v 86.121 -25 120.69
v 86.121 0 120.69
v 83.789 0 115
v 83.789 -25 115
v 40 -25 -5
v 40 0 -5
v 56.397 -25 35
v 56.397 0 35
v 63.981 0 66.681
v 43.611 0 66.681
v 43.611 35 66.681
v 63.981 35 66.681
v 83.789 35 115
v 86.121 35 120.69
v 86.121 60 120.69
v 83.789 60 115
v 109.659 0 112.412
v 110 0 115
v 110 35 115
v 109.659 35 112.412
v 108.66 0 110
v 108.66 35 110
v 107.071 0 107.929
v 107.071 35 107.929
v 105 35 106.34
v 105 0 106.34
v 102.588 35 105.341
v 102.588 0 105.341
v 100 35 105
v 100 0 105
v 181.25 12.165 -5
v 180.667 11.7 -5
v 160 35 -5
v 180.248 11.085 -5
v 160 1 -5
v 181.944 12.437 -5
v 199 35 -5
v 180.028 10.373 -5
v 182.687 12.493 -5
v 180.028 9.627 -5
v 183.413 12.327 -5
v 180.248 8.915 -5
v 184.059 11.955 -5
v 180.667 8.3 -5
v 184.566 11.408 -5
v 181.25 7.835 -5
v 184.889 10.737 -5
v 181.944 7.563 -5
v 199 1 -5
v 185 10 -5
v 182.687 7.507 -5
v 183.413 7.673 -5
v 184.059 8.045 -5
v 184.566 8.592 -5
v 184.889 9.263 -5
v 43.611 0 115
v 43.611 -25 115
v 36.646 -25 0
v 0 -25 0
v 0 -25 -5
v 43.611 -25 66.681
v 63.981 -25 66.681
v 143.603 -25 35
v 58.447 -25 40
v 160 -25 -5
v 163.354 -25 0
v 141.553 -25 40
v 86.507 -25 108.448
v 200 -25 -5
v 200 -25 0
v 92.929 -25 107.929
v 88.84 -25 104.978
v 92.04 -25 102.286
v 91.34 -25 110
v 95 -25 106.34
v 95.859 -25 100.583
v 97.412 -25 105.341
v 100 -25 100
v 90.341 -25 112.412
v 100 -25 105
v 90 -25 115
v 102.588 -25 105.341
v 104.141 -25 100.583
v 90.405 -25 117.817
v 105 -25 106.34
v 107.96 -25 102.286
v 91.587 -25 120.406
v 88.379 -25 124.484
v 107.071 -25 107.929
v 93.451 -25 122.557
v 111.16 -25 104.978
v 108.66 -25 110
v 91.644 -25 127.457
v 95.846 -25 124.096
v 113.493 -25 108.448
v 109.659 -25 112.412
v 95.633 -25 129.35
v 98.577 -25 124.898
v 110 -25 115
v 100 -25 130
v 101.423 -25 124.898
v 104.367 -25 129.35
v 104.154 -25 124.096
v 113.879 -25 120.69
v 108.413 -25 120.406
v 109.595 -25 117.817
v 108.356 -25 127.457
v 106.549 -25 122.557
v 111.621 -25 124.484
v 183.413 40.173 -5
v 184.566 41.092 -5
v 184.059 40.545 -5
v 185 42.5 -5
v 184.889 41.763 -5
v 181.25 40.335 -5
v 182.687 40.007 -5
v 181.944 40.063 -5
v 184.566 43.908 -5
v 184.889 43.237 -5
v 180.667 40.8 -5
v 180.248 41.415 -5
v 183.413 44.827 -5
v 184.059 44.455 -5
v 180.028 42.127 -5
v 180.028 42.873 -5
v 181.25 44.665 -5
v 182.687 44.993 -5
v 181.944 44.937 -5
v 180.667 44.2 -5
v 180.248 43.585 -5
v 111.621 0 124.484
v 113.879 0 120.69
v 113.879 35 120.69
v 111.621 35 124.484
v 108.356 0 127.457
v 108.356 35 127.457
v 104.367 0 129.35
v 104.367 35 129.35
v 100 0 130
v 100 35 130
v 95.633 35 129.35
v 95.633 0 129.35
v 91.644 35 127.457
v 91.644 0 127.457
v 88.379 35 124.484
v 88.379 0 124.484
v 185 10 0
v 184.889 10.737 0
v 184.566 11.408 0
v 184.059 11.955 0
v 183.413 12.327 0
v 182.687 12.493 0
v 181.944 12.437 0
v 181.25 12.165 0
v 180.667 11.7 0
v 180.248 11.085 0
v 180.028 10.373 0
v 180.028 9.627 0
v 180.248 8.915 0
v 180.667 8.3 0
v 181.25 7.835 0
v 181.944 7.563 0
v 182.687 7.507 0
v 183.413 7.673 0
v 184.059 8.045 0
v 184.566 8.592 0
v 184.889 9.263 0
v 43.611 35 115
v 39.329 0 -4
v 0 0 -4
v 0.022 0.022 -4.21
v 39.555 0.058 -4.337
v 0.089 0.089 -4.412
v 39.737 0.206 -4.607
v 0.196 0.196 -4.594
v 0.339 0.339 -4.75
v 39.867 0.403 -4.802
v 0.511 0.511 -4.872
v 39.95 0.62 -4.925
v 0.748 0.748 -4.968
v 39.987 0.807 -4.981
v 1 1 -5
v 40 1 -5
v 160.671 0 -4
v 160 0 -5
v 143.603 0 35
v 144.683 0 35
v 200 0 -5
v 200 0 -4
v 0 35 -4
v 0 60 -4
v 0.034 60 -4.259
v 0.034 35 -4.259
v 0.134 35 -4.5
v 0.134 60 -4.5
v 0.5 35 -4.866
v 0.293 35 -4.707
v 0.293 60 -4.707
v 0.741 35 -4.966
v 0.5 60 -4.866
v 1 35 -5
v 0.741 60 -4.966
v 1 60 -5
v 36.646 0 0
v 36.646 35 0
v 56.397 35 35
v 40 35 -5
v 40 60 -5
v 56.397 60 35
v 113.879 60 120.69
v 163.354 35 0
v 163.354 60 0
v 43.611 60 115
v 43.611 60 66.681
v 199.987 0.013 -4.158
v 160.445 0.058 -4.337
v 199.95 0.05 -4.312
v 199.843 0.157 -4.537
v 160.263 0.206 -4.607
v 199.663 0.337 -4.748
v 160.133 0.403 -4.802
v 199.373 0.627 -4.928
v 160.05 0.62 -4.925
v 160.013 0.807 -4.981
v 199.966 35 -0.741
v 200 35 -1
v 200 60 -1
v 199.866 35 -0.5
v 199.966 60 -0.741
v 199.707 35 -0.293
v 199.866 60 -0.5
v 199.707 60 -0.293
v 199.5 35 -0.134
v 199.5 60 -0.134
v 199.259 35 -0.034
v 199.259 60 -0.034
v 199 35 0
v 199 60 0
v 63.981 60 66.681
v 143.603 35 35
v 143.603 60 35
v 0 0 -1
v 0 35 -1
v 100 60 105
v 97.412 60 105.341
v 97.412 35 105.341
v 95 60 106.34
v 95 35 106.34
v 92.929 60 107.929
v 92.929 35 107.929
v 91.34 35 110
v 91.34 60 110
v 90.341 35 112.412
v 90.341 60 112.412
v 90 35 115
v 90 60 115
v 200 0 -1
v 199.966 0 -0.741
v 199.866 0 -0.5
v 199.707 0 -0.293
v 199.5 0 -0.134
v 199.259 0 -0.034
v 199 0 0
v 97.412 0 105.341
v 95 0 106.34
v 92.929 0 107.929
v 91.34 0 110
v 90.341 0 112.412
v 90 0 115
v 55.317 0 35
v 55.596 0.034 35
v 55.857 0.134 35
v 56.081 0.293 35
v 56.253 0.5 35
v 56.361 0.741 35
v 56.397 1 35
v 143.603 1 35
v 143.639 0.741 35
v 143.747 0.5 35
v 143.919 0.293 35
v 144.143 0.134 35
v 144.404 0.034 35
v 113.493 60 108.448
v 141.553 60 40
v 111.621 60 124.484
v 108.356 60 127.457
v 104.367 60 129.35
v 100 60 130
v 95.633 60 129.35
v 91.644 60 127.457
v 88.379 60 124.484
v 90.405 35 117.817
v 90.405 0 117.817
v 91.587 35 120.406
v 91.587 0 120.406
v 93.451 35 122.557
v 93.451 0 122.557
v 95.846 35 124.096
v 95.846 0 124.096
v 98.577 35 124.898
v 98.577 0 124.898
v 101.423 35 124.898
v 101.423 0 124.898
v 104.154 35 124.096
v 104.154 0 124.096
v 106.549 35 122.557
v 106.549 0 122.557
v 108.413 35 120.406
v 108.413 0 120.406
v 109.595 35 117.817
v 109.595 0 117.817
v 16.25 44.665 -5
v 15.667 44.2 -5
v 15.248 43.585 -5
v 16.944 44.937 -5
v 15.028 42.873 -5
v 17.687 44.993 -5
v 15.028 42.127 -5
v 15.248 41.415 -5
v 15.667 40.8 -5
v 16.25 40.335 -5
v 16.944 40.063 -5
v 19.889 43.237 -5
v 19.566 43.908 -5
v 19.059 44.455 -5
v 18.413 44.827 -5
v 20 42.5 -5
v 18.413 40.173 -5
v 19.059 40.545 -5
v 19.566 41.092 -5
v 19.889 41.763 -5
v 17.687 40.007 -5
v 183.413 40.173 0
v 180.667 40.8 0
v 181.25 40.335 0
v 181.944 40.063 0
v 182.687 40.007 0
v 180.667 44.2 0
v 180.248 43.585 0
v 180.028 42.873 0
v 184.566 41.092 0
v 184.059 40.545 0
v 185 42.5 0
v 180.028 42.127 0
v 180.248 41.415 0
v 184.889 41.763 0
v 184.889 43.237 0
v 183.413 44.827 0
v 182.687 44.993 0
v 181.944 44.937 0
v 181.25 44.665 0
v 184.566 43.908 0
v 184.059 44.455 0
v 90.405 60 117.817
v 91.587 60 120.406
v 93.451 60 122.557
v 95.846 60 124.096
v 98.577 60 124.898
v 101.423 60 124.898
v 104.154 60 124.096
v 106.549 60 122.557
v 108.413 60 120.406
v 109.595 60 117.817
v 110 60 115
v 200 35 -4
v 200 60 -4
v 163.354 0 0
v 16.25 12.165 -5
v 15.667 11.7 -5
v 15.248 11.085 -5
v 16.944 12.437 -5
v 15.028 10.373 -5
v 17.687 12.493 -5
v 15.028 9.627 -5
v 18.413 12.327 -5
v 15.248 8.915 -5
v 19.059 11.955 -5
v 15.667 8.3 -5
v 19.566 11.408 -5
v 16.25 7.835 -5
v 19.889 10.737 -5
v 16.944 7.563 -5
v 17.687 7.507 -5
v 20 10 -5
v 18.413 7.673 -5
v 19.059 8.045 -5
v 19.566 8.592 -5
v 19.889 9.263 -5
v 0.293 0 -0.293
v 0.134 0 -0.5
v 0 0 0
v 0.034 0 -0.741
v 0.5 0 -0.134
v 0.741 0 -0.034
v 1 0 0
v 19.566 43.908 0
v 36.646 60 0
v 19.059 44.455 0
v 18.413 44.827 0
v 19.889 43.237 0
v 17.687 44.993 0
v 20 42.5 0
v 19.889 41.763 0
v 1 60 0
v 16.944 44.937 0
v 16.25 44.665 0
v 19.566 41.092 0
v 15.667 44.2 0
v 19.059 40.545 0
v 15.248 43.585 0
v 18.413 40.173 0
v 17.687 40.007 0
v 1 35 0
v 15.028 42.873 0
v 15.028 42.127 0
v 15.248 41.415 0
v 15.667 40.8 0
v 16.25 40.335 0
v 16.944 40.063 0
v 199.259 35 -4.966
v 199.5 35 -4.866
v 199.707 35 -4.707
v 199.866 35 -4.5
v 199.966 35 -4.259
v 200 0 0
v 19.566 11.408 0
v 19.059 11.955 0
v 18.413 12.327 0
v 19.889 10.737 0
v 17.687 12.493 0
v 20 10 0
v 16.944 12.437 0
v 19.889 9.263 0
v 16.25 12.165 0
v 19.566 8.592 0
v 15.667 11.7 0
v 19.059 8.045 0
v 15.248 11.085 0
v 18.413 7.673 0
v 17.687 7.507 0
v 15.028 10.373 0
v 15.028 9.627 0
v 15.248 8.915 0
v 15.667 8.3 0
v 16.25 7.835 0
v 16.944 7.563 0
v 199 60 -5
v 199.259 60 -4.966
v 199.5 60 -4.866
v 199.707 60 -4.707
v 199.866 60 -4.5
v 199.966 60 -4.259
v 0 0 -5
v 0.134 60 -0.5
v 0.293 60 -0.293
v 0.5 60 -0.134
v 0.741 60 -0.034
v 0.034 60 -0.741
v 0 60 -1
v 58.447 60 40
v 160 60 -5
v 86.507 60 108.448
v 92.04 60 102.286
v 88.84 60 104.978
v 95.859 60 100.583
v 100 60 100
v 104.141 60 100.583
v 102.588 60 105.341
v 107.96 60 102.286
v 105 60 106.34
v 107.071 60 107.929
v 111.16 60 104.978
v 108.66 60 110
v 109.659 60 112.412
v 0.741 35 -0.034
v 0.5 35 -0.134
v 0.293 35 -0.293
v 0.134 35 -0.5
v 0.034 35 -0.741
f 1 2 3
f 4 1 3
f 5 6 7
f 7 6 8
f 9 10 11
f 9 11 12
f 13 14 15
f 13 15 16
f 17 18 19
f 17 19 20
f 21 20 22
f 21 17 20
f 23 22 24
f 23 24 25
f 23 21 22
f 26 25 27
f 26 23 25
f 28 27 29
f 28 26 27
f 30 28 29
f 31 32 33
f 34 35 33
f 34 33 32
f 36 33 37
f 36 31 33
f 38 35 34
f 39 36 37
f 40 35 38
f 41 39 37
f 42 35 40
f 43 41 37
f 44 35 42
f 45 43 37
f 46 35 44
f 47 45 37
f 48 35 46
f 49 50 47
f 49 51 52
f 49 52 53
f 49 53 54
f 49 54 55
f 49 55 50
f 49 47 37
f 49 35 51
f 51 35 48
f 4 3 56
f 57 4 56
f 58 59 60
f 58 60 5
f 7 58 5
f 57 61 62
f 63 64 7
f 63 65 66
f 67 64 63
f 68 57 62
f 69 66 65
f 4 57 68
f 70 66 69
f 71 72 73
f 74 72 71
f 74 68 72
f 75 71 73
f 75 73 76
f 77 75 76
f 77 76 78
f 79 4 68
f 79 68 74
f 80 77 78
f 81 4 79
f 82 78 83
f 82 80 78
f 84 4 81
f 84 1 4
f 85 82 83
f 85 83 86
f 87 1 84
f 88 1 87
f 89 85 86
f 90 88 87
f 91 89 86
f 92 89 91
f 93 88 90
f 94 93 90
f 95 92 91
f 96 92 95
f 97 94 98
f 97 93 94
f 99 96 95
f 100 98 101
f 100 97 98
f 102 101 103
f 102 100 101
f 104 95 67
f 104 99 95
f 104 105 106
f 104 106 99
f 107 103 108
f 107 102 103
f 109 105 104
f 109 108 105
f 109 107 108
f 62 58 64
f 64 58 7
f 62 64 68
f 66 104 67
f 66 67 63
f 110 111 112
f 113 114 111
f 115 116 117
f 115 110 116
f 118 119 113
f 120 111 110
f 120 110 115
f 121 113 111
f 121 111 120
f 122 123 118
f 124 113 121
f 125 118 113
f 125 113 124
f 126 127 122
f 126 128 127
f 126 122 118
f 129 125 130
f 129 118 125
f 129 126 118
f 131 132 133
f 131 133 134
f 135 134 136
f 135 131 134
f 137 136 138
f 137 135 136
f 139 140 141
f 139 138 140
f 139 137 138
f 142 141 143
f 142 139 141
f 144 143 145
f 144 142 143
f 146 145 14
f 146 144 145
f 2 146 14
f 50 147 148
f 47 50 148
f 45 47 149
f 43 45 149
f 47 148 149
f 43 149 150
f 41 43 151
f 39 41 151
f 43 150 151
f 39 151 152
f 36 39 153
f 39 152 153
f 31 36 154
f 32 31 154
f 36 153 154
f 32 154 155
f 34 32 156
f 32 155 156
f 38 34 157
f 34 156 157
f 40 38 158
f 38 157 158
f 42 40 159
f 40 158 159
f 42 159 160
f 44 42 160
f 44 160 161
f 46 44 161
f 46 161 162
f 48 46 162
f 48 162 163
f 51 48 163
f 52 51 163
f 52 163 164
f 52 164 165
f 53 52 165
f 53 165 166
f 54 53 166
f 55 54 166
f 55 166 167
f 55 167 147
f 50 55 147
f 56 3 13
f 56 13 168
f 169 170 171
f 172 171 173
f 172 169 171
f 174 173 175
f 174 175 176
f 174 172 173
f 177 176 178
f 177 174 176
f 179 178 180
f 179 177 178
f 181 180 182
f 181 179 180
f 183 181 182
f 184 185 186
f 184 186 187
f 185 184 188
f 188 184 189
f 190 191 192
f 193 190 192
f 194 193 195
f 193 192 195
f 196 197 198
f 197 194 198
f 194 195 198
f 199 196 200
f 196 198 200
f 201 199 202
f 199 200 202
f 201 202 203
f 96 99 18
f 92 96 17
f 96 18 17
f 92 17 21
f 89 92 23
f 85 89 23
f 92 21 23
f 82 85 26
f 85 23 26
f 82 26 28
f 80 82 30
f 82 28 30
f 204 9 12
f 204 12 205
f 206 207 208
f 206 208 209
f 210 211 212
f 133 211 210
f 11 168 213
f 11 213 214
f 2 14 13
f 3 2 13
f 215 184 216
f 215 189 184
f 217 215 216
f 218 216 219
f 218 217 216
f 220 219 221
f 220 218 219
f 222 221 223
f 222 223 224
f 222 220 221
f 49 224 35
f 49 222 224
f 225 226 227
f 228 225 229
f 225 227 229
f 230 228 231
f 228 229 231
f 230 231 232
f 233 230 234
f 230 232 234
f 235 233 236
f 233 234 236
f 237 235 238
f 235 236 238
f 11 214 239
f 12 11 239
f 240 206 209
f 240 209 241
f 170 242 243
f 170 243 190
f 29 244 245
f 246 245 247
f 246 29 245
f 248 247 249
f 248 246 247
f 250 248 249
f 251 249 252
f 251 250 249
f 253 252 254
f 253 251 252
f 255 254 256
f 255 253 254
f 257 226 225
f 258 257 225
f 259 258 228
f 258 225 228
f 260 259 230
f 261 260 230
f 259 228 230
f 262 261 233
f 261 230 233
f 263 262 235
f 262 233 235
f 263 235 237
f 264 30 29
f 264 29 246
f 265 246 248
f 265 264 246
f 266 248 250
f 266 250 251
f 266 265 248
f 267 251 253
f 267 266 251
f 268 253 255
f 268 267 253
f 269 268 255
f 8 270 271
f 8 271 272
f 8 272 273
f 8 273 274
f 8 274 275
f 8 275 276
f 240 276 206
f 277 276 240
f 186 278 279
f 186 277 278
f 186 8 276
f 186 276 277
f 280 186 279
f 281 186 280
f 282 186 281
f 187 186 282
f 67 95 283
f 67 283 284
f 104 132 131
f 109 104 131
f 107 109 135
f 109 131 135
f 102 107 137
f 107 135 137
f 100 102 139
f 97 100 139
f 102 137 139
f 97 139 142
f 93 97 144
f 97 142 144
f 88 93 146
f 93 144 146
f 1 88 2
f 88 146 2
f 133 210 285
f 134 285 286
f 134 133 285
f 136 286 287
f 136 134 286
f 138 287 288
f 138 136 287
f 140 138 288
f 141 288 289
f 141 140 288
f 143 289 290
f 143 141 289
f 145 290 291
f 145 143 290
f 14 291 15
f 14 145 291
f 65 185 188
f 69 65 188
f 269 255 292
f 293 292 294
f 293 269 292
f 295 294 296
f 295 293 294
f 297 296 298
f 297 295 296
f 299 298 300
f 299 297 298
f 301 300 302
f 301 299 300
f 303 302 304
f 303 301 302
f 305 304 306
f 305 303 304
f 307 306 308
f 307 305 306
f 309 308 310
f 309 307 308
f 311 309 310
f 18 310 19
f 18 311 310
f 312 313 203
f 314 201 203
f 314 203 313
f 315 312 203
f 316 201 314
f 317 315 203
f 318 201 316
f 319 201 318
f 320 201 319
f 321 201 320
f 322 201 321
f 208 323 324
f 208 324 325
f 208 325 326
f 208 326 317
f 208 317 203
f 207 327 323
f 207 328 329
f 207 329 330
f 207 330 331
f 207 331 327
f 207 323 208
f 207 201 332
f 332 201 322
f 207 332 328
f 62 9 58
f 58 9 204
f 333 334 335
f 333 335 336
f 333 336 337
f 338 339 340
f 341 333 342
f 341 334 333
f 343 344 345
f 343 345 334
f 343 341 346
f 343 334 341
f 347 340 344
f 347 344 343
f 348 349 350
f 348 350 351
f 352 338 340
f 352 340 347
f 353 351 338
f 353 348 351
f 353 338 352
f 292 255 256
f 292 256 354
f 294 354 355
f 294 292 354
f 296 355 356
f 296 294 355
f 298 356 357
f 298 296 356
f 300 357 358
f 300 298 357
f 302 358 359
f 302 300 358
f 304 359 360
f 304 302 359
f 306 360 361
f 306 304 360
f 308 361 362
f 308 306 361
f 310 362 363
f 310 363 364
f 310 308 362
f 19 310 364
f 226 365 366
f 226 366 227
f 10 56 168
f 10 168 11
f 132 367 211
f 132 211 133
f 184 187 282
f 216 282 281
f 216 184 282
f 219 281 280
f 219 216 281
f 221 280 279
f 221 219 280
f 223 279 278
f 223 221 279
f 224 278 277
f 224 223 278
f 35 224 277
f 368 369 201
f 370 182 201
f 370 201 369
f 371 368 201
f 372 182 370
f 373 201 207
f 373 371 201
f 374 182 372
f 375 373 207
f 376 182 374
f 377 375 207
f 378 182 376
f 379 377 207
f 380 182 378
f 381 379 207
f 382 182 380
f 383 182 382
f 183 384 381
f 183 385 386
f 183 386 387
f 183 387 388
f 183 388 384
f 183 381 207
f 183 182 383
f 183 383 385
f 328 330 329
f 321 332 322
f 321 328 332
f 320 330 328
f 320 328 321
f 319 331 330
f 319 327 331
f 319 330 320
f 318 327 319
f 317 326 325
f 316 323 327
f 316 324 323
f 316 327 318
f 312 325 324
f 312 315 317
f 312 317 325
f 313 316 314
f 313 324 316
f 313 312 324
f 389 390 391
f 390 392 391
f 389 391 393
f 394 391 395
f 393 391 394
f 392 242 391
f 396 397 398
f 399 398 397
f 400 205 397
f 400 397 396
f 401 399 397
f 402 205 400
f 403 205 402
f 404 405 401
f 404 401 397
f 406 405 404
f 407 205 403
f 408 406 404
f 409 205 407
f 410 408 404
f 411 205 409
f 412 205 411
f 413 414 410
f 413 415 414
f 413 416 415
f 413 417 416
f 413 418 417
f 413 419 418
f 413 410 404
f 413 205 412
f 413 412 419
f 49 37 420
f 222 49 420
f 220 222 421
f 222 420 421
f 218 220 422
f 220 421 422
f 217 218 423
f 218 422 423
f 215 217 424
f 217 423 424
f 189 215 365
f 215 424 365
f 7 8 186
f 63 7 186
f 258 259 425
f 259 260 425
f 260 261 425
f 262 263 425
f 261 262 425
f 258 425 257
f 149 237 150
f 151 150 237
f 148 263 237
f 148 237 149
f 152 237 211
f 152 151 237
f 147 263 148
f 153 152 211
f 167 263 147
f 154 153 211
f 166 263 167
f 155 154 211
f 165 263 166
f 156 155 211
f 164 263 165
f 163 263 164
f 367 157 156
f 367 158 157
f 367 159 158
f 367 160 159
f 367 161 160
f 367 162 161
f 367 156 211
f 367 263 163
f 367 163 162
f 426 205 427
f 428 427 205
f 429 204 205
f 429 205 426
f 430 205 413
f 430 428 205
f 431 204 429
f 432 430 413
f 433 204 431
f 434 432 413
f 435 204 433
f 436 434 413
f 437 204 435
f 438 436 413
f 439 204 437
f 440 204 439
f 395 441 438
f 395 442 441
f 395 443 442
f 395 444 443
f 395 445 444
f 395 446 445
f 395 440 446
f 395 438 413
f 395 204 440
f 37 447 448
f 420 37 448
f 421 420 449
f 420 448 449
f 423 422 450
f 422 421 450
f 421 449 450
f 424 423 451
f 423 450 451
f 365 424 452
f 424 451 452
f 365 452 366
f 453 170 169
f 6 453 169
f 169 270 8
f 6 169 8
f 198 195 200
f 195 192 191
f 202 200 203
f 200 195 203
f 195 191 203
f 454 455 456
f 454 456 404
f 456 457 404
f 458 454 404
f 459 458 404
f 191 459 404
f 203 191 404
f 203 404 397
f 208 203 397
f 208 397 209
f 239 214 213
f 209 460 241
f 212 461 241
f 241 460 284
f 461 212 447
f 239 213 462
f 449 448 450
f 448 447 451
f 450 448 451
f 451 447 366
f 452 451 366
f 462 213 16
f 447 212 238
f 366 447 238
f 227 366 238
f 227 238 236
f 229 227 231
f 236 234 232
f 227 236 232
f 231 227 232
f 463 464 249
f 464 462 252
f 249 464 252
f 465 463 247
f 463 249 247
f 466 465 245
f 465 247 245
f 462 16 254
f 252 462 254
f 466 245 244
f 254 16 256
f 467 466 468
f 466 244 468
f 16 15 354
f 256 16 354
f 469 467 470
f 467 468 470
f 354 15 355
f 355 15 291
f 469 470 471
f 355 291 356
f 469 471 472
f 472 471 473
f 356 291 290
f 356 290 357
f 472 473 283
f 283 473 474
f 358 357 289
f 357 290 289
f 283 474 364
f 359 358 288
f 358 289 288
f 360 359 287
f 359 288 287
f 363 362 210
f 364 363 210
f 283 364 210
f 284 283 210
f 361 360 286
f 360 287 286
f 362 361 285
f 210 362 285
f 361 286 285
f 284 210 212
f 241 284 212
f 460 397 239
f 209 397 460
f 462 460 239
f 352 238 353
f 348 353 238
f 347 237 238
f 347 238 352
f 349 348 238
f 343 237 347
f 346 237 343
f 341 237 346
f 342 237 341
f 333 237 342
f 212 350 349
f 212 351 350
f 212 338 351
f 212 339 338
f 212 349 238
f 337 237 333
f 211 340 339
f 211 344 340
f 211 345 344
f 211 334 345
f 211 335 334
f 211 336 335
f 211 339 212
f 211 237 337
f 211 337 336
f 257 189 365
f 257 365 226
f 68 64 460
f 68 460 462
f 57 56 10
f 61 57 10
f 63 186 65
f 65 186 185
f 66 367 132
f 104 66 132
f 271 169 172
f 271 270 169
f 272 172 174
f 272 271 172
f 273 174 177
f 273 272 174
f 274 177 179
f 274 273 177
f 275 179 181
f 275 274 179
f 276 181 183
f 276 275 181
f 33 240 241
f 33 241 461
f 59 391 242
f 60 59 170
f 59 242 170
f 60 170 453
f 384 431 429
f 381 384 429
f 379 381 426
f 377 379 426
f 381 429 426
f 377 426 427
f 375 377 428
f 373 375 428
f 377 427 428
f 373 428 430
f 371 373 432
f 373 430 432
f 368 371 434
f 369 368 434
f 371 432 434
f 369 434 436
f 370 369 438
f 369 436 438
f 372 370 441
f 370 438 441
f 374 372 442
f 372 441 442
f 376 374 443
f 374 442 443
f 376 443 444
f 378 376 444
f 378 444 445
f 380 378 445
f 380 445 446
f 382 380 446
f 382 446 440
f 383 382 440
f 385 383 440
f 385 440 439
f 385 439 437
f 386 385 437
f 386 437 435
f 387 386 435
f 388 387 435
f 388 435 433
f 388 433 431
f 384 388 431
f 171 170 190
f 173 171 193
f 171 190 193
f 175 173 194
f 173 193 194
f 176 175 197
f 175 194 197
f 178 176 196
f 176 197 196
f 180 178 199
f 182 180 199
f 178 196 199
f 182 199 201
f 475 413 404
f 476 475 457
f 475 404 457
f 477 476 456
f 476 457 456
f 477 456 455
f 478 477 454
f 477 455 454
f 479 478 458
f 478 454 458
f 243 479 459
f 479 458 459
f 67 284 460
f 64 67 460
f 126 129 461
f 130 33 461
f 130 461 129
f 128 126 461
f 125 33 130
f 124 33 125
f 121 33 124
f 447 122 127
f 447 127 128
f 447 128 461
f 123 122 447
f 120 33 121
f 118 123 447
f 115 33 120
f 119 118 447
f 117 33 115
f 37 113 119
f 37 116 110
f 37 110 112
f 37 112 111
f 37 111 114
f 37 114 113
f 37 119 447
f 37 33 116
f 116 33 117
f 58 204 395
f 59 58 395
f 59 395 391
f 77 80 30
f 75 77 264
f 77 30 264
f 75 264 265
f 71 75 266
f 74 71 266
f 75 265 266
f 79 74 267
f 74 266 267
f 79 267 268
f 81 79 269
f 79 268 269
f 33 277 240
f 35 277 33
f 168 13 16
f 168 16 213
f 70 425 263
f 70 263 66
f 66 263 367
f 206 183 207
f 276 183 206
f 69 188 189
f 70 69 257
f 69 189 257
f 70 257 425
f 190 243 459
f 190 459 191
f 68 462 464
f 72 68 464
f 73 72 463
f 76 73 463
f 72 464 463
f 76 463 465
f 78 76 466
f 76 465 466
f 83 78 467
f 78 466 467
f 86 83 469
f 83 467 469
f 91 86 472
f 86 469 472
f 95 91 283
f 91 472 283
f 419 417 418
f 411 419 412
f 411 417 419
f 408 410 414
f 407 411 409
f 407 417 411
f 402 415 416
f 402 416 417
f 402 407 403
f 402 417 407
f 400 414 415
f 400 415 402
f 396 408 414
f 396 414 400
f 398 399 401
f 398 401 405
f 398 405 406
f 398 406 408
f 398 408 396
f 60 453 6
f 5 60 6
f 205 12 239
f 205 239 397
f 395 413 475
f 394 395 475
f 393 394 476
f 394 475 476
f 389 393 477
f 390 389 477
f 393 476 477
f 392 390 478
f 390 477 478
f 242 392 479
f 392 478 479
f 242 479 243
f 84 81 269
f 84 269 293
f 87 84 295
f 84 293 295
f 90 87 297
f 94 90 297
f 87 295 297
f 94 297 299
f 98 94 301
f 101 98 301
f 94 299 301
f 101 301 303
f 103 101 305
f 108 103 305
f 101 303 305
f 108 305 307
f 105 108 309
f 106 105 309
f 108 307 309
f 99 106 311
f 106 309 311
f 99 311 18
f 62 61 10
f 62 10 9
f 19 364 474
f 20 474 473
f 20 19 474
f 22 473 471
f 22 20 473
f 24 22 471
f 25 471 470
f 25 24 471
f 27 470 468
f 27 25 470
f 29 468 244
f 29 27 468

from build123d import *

# Parameters (mm, degrees)
F1_DEPTH   = 60
F2_R       = 2.5
F3_DEPTH   = 5.001
F4_R       = 1
F1_FACE1_R = 10
F5_DEPTH   = 25


with BuildPart() as f1:
    # F0 (on Front) → F1 (new body)
    with BuildSketch(Plane.XZ):
        with BuildLine():
            Line((69.3844701811, 66.6805505753), (86.5065387851, 108.4481678561))
            ThreePointArc((86.5065387851, 108.4481678561), (92.0400214246, 102.28627745), (100, 100))
            Line((100, 100), (100, 105))
            ThreePointArc((100, 105), (92.9289321881, 107.9289321881), (90, 115))
            Line((90, 115), (83.7885603577, 115))
            Line((83.7885603577, 115), (63.980656967, 66.6805505753))
            Line((63.980656967, 66.6805505753), (69.3844701811, 66.6805505753))
        make_face()
        with BuildLine():
            Line((100, 105), (100, 100))
            ThreePointArc((100, 100), (107.9599785754, 102.28627745), (113.4934612149, 108.4481678561))
            Line((113.4934612149, 108.4481678561), (141.5528599106, 40))
            Line((141.5528599106, 40), (58.4471400894, 40))
            Line((58.4471400894, 40), (69.3844701811, 66.6805505753))
            Line((69.3844701811, 66.6805505753), (63.980656967, 66.6805505753))
            Line((63.980656967, 66.6805505753), (36.6458690181, 0))
            Line((36.6458690181, 0), (0, 0))
            Line((0, 0), (0, -5))
            Line((0, -5), (40, -5))
            Line((40, -5), (56.3974578573, 35))
            Line((56.3974578573, 35), (143.6025421427, 35))
            Line((143.6025421427, 35), (160, -5))
            Line((160, -5), (200, -5))
            Line((200, -5), (200, 0))
            Line((200, 0), (163.3541309819, 0))
            Line((163.3541309819, 0), (113.8790881603, 120.6895440801))
            ThreePointArc((113.8790881603, 120.6895440801), (100, 130), (86.1209118397, 120.6895440801))
            Line((86.1209118397, 120.6895440801), (83.7885603577, 115))
            Line((83.7885603577, 115), (90, 115))
            ThreePointArc((90, 115), (100, 125), (110, 115))
            ThreePointArc((110, 115), (107.0710678119, 107.9289321881), (100, 105))
        make_face()
        Polygon((43.611112982, 66.6805505753), (63.980656967, 66.6805505753), (83.7885603577, 115), (43.611112982, 115), align=None)
    extrude(amount=-F1_DEPTH)

    # F2 (on face) → F3 (cut, through all)
    with BuildSketch(Plane.XY):
        with Locations((182.5, 10)):
            Circle(F2_R)
        with Locations((182.5, 42.5)):
            Circle(F2_R)
        with Locations((17.5, 10)):
            Circle(F2_R)
        with Locations((17.5, 42.5)):
            Circle(F2_R)
    extrude(amount=-F3_DEPTH, mode=Mode.SUBTRACT)

    # F4
    f4_edges = [f1.edges().sort_by_distance(p)[0] for p in [
        (200, 30, 0),
        (200, 30, -5),
        (0, 30, 0),
        (0, 30, -5),
        (151.801271, 0, 15),
        (180, 0, -5),
        (20, 0, -5),
        (48.198729, 0, 15),
    ]]
    fillet(f4_edges, radius=F4_R)

    # F0 (on Front) + F1_face1 (on face) → F5 (join)
    with BuildSketch(Plane.XZ):
        with BuildLine():
            Line((69.3844701811, 66.6805505753), (86.5065387851, 108.4481678561))
            ThreePointArc((86.5065387851, 108.4481678561), (92.0400214246, 102.28627745), (100, 100))
            Line((100, 100), (100, 105))
            ThreePointArc((100, 105), (92.9289321881, 107.9289321881), (90, 115))
            Line((90, 115), (83.7885603577, 115))
            Line((83.7885603577, 115), (63.980656967, 66.6805505753))
            Line((63.980656967, 66.6805505753), (69.3844701811, 66.6805505753))
        make_face()
        with BuildLine():
            Line((100, 105), (100, 100))
            ThreePointArc((100, 100), (107.9599785754, 102.28627745), (113.4934612149, 108.4481678561))
            Line((113.4934612149, 108.4481678561), (141.5528599106, 40))
            Line((141.5528599106, 40), (58.4471400894, 40))
            Line((58.4471400894, 40), (69.3844701811, 66.6805505753))
            Line((69.3844701811, 66.6805505753), (63.980656967, 66.6805505753))
            Line((63.980656967, 66.6805505753), (36.6458690181, 0))
            Line((36.6458690181, 0), (0, 0))
            Line((0, 0), (0, -5))
            Line((0, -5), (40, -5))
            Line((40, -5), (56.3974578573, 35))
            Line((56.3974578573, 35), (143.6025421427, 35))
            Line((143.6025421427, 35), (160, -5))
            Line((160, -5), (200, -5))
            Line((200, -5), (200, 0))
            Line((200, 0), (163.3541309819, 0))
            Line((163.3541309819, 0), (113.8790881603, 120.6895440801))
            ThreePointArc((113.8790881603, 120.6895440801), (100, 130), (86.1209118397, 120.6895440801))
            Line((86.1209118397, 120.6895440801), (83.7885603577, 115))
            Line((83.7885603577, 115), (90, 115))
            ThreePointArc((90, 115), (100, 125), (110, 115))
            ThreePointArc((110, 115), (107.0710678119, 107.9289321881), (100, 105))
        make_face()
        Polygon((43.611112982, 66.6805505753), (63.980656967, 66.6805505753), (83.7885603577, 115), (43.611112982, 115), align=None)
    with BuildSketch(Plane(origin=(84.7585463742, 60, 67.9155553521), x_dir=(1, 0, 0), z_dir=(0, 1, 0))):
        with BuildLine():
            Line((-83.7585463742, 67.9155553521), (-48.1126773562, 67.9155553521))
            Line((-48.1126773562, 67.9155553521), (-20.7778894072, 1.2350047768))
            Line((-20.7778894072, 1.2350047768), (-41.1474333922, 1.2350047768))
            Line((-41.1474333922, 1.2350047768), (-41.1474333922, -47.0844446479))
            Line((-41.1474333922, -47.0844446479), (-0.9699860165, -47.0844446479))
            Line((-0.9699860165, -47.0844446479), (1.3623654655, -52.7739887281))
            ThreePointArc((1.3623654655, -52.7739887281), (15.2414536258, -62.0844446479), (29.120541786, -52.7739887281))
            Line((29.120541786, -52.7739887281), (78.5955846077, 67.9155553521))
            Line((78.5955846077, 67.9155553521), (114.2414536258, 67.9155553521))
            ThreePointArc((114.2414536258, 67.9155553521), (114.948560407, 68.2084485709), (115.2414536258, 68.9155553521))
            Line((115.2414536258, 68.9155553521), (115.2414536258, 71.9155553521))
            ThreePointArc((115.2414536258, 71.9155553521), (114.948560407, 72.6226621332), (114.2414536258, 72.9155553521))
            Line((114.2414536258, 72.9155553521), (75.2414536258, 72.9155553521))
            Line((75.2414536258, 72.9155553521), (58.8439957685, 32.9155553521))
            Line((58.8439957685, 32.9155553521), (-28.3610885169, 32.9155553521))
            Line((-28.3610885169, 32.9155553521), (-44.7585463742, 72.9155553521))
            Line((-44.7585463742, 72.9155553521), (-83.7585463742, 72.9155553521))
            ThreePointArc((-83.7585463742, 72.9155553521), (-84.4656531554, 72.6226621332), (-84.7585463742, 71.9155553521))
            Line((-84.7585463742, 71.9155553521), (-84.7585463742, 68.9155553521))
            ThreePointArc((-84.7585463742, 68.9155553521), (-84.4656531554, 68.2084485709), (-83.7585463742, 67.9155553521))
        make_face()
        with BuildLine():
            ThreePointArc((28.7349148407, -40.532612504), (15.2414536258, -32.0844446479), (1.7479924109, -40.532612504))
            Line((1.7479924109, -40.532612504), (-26.3114062848, 27.9155553521))
            Line((-26.3114062848, 27.9155553521), (56.7943135364, 27.9155553521))
            Line((56.7943135364, 27.9155553521), (28.7349148407, -40.532612504))
        make_face(mode=Mode.SUBTRACT)
        with Locations((15.2414536258, -47.0844446479)):
            Circle(F1_FACE1_R, mode=Mode.SUBTRACT)
    extrude(amount=F5_DEPTH, dir=(0, -1, 0))


solid = f1.part
